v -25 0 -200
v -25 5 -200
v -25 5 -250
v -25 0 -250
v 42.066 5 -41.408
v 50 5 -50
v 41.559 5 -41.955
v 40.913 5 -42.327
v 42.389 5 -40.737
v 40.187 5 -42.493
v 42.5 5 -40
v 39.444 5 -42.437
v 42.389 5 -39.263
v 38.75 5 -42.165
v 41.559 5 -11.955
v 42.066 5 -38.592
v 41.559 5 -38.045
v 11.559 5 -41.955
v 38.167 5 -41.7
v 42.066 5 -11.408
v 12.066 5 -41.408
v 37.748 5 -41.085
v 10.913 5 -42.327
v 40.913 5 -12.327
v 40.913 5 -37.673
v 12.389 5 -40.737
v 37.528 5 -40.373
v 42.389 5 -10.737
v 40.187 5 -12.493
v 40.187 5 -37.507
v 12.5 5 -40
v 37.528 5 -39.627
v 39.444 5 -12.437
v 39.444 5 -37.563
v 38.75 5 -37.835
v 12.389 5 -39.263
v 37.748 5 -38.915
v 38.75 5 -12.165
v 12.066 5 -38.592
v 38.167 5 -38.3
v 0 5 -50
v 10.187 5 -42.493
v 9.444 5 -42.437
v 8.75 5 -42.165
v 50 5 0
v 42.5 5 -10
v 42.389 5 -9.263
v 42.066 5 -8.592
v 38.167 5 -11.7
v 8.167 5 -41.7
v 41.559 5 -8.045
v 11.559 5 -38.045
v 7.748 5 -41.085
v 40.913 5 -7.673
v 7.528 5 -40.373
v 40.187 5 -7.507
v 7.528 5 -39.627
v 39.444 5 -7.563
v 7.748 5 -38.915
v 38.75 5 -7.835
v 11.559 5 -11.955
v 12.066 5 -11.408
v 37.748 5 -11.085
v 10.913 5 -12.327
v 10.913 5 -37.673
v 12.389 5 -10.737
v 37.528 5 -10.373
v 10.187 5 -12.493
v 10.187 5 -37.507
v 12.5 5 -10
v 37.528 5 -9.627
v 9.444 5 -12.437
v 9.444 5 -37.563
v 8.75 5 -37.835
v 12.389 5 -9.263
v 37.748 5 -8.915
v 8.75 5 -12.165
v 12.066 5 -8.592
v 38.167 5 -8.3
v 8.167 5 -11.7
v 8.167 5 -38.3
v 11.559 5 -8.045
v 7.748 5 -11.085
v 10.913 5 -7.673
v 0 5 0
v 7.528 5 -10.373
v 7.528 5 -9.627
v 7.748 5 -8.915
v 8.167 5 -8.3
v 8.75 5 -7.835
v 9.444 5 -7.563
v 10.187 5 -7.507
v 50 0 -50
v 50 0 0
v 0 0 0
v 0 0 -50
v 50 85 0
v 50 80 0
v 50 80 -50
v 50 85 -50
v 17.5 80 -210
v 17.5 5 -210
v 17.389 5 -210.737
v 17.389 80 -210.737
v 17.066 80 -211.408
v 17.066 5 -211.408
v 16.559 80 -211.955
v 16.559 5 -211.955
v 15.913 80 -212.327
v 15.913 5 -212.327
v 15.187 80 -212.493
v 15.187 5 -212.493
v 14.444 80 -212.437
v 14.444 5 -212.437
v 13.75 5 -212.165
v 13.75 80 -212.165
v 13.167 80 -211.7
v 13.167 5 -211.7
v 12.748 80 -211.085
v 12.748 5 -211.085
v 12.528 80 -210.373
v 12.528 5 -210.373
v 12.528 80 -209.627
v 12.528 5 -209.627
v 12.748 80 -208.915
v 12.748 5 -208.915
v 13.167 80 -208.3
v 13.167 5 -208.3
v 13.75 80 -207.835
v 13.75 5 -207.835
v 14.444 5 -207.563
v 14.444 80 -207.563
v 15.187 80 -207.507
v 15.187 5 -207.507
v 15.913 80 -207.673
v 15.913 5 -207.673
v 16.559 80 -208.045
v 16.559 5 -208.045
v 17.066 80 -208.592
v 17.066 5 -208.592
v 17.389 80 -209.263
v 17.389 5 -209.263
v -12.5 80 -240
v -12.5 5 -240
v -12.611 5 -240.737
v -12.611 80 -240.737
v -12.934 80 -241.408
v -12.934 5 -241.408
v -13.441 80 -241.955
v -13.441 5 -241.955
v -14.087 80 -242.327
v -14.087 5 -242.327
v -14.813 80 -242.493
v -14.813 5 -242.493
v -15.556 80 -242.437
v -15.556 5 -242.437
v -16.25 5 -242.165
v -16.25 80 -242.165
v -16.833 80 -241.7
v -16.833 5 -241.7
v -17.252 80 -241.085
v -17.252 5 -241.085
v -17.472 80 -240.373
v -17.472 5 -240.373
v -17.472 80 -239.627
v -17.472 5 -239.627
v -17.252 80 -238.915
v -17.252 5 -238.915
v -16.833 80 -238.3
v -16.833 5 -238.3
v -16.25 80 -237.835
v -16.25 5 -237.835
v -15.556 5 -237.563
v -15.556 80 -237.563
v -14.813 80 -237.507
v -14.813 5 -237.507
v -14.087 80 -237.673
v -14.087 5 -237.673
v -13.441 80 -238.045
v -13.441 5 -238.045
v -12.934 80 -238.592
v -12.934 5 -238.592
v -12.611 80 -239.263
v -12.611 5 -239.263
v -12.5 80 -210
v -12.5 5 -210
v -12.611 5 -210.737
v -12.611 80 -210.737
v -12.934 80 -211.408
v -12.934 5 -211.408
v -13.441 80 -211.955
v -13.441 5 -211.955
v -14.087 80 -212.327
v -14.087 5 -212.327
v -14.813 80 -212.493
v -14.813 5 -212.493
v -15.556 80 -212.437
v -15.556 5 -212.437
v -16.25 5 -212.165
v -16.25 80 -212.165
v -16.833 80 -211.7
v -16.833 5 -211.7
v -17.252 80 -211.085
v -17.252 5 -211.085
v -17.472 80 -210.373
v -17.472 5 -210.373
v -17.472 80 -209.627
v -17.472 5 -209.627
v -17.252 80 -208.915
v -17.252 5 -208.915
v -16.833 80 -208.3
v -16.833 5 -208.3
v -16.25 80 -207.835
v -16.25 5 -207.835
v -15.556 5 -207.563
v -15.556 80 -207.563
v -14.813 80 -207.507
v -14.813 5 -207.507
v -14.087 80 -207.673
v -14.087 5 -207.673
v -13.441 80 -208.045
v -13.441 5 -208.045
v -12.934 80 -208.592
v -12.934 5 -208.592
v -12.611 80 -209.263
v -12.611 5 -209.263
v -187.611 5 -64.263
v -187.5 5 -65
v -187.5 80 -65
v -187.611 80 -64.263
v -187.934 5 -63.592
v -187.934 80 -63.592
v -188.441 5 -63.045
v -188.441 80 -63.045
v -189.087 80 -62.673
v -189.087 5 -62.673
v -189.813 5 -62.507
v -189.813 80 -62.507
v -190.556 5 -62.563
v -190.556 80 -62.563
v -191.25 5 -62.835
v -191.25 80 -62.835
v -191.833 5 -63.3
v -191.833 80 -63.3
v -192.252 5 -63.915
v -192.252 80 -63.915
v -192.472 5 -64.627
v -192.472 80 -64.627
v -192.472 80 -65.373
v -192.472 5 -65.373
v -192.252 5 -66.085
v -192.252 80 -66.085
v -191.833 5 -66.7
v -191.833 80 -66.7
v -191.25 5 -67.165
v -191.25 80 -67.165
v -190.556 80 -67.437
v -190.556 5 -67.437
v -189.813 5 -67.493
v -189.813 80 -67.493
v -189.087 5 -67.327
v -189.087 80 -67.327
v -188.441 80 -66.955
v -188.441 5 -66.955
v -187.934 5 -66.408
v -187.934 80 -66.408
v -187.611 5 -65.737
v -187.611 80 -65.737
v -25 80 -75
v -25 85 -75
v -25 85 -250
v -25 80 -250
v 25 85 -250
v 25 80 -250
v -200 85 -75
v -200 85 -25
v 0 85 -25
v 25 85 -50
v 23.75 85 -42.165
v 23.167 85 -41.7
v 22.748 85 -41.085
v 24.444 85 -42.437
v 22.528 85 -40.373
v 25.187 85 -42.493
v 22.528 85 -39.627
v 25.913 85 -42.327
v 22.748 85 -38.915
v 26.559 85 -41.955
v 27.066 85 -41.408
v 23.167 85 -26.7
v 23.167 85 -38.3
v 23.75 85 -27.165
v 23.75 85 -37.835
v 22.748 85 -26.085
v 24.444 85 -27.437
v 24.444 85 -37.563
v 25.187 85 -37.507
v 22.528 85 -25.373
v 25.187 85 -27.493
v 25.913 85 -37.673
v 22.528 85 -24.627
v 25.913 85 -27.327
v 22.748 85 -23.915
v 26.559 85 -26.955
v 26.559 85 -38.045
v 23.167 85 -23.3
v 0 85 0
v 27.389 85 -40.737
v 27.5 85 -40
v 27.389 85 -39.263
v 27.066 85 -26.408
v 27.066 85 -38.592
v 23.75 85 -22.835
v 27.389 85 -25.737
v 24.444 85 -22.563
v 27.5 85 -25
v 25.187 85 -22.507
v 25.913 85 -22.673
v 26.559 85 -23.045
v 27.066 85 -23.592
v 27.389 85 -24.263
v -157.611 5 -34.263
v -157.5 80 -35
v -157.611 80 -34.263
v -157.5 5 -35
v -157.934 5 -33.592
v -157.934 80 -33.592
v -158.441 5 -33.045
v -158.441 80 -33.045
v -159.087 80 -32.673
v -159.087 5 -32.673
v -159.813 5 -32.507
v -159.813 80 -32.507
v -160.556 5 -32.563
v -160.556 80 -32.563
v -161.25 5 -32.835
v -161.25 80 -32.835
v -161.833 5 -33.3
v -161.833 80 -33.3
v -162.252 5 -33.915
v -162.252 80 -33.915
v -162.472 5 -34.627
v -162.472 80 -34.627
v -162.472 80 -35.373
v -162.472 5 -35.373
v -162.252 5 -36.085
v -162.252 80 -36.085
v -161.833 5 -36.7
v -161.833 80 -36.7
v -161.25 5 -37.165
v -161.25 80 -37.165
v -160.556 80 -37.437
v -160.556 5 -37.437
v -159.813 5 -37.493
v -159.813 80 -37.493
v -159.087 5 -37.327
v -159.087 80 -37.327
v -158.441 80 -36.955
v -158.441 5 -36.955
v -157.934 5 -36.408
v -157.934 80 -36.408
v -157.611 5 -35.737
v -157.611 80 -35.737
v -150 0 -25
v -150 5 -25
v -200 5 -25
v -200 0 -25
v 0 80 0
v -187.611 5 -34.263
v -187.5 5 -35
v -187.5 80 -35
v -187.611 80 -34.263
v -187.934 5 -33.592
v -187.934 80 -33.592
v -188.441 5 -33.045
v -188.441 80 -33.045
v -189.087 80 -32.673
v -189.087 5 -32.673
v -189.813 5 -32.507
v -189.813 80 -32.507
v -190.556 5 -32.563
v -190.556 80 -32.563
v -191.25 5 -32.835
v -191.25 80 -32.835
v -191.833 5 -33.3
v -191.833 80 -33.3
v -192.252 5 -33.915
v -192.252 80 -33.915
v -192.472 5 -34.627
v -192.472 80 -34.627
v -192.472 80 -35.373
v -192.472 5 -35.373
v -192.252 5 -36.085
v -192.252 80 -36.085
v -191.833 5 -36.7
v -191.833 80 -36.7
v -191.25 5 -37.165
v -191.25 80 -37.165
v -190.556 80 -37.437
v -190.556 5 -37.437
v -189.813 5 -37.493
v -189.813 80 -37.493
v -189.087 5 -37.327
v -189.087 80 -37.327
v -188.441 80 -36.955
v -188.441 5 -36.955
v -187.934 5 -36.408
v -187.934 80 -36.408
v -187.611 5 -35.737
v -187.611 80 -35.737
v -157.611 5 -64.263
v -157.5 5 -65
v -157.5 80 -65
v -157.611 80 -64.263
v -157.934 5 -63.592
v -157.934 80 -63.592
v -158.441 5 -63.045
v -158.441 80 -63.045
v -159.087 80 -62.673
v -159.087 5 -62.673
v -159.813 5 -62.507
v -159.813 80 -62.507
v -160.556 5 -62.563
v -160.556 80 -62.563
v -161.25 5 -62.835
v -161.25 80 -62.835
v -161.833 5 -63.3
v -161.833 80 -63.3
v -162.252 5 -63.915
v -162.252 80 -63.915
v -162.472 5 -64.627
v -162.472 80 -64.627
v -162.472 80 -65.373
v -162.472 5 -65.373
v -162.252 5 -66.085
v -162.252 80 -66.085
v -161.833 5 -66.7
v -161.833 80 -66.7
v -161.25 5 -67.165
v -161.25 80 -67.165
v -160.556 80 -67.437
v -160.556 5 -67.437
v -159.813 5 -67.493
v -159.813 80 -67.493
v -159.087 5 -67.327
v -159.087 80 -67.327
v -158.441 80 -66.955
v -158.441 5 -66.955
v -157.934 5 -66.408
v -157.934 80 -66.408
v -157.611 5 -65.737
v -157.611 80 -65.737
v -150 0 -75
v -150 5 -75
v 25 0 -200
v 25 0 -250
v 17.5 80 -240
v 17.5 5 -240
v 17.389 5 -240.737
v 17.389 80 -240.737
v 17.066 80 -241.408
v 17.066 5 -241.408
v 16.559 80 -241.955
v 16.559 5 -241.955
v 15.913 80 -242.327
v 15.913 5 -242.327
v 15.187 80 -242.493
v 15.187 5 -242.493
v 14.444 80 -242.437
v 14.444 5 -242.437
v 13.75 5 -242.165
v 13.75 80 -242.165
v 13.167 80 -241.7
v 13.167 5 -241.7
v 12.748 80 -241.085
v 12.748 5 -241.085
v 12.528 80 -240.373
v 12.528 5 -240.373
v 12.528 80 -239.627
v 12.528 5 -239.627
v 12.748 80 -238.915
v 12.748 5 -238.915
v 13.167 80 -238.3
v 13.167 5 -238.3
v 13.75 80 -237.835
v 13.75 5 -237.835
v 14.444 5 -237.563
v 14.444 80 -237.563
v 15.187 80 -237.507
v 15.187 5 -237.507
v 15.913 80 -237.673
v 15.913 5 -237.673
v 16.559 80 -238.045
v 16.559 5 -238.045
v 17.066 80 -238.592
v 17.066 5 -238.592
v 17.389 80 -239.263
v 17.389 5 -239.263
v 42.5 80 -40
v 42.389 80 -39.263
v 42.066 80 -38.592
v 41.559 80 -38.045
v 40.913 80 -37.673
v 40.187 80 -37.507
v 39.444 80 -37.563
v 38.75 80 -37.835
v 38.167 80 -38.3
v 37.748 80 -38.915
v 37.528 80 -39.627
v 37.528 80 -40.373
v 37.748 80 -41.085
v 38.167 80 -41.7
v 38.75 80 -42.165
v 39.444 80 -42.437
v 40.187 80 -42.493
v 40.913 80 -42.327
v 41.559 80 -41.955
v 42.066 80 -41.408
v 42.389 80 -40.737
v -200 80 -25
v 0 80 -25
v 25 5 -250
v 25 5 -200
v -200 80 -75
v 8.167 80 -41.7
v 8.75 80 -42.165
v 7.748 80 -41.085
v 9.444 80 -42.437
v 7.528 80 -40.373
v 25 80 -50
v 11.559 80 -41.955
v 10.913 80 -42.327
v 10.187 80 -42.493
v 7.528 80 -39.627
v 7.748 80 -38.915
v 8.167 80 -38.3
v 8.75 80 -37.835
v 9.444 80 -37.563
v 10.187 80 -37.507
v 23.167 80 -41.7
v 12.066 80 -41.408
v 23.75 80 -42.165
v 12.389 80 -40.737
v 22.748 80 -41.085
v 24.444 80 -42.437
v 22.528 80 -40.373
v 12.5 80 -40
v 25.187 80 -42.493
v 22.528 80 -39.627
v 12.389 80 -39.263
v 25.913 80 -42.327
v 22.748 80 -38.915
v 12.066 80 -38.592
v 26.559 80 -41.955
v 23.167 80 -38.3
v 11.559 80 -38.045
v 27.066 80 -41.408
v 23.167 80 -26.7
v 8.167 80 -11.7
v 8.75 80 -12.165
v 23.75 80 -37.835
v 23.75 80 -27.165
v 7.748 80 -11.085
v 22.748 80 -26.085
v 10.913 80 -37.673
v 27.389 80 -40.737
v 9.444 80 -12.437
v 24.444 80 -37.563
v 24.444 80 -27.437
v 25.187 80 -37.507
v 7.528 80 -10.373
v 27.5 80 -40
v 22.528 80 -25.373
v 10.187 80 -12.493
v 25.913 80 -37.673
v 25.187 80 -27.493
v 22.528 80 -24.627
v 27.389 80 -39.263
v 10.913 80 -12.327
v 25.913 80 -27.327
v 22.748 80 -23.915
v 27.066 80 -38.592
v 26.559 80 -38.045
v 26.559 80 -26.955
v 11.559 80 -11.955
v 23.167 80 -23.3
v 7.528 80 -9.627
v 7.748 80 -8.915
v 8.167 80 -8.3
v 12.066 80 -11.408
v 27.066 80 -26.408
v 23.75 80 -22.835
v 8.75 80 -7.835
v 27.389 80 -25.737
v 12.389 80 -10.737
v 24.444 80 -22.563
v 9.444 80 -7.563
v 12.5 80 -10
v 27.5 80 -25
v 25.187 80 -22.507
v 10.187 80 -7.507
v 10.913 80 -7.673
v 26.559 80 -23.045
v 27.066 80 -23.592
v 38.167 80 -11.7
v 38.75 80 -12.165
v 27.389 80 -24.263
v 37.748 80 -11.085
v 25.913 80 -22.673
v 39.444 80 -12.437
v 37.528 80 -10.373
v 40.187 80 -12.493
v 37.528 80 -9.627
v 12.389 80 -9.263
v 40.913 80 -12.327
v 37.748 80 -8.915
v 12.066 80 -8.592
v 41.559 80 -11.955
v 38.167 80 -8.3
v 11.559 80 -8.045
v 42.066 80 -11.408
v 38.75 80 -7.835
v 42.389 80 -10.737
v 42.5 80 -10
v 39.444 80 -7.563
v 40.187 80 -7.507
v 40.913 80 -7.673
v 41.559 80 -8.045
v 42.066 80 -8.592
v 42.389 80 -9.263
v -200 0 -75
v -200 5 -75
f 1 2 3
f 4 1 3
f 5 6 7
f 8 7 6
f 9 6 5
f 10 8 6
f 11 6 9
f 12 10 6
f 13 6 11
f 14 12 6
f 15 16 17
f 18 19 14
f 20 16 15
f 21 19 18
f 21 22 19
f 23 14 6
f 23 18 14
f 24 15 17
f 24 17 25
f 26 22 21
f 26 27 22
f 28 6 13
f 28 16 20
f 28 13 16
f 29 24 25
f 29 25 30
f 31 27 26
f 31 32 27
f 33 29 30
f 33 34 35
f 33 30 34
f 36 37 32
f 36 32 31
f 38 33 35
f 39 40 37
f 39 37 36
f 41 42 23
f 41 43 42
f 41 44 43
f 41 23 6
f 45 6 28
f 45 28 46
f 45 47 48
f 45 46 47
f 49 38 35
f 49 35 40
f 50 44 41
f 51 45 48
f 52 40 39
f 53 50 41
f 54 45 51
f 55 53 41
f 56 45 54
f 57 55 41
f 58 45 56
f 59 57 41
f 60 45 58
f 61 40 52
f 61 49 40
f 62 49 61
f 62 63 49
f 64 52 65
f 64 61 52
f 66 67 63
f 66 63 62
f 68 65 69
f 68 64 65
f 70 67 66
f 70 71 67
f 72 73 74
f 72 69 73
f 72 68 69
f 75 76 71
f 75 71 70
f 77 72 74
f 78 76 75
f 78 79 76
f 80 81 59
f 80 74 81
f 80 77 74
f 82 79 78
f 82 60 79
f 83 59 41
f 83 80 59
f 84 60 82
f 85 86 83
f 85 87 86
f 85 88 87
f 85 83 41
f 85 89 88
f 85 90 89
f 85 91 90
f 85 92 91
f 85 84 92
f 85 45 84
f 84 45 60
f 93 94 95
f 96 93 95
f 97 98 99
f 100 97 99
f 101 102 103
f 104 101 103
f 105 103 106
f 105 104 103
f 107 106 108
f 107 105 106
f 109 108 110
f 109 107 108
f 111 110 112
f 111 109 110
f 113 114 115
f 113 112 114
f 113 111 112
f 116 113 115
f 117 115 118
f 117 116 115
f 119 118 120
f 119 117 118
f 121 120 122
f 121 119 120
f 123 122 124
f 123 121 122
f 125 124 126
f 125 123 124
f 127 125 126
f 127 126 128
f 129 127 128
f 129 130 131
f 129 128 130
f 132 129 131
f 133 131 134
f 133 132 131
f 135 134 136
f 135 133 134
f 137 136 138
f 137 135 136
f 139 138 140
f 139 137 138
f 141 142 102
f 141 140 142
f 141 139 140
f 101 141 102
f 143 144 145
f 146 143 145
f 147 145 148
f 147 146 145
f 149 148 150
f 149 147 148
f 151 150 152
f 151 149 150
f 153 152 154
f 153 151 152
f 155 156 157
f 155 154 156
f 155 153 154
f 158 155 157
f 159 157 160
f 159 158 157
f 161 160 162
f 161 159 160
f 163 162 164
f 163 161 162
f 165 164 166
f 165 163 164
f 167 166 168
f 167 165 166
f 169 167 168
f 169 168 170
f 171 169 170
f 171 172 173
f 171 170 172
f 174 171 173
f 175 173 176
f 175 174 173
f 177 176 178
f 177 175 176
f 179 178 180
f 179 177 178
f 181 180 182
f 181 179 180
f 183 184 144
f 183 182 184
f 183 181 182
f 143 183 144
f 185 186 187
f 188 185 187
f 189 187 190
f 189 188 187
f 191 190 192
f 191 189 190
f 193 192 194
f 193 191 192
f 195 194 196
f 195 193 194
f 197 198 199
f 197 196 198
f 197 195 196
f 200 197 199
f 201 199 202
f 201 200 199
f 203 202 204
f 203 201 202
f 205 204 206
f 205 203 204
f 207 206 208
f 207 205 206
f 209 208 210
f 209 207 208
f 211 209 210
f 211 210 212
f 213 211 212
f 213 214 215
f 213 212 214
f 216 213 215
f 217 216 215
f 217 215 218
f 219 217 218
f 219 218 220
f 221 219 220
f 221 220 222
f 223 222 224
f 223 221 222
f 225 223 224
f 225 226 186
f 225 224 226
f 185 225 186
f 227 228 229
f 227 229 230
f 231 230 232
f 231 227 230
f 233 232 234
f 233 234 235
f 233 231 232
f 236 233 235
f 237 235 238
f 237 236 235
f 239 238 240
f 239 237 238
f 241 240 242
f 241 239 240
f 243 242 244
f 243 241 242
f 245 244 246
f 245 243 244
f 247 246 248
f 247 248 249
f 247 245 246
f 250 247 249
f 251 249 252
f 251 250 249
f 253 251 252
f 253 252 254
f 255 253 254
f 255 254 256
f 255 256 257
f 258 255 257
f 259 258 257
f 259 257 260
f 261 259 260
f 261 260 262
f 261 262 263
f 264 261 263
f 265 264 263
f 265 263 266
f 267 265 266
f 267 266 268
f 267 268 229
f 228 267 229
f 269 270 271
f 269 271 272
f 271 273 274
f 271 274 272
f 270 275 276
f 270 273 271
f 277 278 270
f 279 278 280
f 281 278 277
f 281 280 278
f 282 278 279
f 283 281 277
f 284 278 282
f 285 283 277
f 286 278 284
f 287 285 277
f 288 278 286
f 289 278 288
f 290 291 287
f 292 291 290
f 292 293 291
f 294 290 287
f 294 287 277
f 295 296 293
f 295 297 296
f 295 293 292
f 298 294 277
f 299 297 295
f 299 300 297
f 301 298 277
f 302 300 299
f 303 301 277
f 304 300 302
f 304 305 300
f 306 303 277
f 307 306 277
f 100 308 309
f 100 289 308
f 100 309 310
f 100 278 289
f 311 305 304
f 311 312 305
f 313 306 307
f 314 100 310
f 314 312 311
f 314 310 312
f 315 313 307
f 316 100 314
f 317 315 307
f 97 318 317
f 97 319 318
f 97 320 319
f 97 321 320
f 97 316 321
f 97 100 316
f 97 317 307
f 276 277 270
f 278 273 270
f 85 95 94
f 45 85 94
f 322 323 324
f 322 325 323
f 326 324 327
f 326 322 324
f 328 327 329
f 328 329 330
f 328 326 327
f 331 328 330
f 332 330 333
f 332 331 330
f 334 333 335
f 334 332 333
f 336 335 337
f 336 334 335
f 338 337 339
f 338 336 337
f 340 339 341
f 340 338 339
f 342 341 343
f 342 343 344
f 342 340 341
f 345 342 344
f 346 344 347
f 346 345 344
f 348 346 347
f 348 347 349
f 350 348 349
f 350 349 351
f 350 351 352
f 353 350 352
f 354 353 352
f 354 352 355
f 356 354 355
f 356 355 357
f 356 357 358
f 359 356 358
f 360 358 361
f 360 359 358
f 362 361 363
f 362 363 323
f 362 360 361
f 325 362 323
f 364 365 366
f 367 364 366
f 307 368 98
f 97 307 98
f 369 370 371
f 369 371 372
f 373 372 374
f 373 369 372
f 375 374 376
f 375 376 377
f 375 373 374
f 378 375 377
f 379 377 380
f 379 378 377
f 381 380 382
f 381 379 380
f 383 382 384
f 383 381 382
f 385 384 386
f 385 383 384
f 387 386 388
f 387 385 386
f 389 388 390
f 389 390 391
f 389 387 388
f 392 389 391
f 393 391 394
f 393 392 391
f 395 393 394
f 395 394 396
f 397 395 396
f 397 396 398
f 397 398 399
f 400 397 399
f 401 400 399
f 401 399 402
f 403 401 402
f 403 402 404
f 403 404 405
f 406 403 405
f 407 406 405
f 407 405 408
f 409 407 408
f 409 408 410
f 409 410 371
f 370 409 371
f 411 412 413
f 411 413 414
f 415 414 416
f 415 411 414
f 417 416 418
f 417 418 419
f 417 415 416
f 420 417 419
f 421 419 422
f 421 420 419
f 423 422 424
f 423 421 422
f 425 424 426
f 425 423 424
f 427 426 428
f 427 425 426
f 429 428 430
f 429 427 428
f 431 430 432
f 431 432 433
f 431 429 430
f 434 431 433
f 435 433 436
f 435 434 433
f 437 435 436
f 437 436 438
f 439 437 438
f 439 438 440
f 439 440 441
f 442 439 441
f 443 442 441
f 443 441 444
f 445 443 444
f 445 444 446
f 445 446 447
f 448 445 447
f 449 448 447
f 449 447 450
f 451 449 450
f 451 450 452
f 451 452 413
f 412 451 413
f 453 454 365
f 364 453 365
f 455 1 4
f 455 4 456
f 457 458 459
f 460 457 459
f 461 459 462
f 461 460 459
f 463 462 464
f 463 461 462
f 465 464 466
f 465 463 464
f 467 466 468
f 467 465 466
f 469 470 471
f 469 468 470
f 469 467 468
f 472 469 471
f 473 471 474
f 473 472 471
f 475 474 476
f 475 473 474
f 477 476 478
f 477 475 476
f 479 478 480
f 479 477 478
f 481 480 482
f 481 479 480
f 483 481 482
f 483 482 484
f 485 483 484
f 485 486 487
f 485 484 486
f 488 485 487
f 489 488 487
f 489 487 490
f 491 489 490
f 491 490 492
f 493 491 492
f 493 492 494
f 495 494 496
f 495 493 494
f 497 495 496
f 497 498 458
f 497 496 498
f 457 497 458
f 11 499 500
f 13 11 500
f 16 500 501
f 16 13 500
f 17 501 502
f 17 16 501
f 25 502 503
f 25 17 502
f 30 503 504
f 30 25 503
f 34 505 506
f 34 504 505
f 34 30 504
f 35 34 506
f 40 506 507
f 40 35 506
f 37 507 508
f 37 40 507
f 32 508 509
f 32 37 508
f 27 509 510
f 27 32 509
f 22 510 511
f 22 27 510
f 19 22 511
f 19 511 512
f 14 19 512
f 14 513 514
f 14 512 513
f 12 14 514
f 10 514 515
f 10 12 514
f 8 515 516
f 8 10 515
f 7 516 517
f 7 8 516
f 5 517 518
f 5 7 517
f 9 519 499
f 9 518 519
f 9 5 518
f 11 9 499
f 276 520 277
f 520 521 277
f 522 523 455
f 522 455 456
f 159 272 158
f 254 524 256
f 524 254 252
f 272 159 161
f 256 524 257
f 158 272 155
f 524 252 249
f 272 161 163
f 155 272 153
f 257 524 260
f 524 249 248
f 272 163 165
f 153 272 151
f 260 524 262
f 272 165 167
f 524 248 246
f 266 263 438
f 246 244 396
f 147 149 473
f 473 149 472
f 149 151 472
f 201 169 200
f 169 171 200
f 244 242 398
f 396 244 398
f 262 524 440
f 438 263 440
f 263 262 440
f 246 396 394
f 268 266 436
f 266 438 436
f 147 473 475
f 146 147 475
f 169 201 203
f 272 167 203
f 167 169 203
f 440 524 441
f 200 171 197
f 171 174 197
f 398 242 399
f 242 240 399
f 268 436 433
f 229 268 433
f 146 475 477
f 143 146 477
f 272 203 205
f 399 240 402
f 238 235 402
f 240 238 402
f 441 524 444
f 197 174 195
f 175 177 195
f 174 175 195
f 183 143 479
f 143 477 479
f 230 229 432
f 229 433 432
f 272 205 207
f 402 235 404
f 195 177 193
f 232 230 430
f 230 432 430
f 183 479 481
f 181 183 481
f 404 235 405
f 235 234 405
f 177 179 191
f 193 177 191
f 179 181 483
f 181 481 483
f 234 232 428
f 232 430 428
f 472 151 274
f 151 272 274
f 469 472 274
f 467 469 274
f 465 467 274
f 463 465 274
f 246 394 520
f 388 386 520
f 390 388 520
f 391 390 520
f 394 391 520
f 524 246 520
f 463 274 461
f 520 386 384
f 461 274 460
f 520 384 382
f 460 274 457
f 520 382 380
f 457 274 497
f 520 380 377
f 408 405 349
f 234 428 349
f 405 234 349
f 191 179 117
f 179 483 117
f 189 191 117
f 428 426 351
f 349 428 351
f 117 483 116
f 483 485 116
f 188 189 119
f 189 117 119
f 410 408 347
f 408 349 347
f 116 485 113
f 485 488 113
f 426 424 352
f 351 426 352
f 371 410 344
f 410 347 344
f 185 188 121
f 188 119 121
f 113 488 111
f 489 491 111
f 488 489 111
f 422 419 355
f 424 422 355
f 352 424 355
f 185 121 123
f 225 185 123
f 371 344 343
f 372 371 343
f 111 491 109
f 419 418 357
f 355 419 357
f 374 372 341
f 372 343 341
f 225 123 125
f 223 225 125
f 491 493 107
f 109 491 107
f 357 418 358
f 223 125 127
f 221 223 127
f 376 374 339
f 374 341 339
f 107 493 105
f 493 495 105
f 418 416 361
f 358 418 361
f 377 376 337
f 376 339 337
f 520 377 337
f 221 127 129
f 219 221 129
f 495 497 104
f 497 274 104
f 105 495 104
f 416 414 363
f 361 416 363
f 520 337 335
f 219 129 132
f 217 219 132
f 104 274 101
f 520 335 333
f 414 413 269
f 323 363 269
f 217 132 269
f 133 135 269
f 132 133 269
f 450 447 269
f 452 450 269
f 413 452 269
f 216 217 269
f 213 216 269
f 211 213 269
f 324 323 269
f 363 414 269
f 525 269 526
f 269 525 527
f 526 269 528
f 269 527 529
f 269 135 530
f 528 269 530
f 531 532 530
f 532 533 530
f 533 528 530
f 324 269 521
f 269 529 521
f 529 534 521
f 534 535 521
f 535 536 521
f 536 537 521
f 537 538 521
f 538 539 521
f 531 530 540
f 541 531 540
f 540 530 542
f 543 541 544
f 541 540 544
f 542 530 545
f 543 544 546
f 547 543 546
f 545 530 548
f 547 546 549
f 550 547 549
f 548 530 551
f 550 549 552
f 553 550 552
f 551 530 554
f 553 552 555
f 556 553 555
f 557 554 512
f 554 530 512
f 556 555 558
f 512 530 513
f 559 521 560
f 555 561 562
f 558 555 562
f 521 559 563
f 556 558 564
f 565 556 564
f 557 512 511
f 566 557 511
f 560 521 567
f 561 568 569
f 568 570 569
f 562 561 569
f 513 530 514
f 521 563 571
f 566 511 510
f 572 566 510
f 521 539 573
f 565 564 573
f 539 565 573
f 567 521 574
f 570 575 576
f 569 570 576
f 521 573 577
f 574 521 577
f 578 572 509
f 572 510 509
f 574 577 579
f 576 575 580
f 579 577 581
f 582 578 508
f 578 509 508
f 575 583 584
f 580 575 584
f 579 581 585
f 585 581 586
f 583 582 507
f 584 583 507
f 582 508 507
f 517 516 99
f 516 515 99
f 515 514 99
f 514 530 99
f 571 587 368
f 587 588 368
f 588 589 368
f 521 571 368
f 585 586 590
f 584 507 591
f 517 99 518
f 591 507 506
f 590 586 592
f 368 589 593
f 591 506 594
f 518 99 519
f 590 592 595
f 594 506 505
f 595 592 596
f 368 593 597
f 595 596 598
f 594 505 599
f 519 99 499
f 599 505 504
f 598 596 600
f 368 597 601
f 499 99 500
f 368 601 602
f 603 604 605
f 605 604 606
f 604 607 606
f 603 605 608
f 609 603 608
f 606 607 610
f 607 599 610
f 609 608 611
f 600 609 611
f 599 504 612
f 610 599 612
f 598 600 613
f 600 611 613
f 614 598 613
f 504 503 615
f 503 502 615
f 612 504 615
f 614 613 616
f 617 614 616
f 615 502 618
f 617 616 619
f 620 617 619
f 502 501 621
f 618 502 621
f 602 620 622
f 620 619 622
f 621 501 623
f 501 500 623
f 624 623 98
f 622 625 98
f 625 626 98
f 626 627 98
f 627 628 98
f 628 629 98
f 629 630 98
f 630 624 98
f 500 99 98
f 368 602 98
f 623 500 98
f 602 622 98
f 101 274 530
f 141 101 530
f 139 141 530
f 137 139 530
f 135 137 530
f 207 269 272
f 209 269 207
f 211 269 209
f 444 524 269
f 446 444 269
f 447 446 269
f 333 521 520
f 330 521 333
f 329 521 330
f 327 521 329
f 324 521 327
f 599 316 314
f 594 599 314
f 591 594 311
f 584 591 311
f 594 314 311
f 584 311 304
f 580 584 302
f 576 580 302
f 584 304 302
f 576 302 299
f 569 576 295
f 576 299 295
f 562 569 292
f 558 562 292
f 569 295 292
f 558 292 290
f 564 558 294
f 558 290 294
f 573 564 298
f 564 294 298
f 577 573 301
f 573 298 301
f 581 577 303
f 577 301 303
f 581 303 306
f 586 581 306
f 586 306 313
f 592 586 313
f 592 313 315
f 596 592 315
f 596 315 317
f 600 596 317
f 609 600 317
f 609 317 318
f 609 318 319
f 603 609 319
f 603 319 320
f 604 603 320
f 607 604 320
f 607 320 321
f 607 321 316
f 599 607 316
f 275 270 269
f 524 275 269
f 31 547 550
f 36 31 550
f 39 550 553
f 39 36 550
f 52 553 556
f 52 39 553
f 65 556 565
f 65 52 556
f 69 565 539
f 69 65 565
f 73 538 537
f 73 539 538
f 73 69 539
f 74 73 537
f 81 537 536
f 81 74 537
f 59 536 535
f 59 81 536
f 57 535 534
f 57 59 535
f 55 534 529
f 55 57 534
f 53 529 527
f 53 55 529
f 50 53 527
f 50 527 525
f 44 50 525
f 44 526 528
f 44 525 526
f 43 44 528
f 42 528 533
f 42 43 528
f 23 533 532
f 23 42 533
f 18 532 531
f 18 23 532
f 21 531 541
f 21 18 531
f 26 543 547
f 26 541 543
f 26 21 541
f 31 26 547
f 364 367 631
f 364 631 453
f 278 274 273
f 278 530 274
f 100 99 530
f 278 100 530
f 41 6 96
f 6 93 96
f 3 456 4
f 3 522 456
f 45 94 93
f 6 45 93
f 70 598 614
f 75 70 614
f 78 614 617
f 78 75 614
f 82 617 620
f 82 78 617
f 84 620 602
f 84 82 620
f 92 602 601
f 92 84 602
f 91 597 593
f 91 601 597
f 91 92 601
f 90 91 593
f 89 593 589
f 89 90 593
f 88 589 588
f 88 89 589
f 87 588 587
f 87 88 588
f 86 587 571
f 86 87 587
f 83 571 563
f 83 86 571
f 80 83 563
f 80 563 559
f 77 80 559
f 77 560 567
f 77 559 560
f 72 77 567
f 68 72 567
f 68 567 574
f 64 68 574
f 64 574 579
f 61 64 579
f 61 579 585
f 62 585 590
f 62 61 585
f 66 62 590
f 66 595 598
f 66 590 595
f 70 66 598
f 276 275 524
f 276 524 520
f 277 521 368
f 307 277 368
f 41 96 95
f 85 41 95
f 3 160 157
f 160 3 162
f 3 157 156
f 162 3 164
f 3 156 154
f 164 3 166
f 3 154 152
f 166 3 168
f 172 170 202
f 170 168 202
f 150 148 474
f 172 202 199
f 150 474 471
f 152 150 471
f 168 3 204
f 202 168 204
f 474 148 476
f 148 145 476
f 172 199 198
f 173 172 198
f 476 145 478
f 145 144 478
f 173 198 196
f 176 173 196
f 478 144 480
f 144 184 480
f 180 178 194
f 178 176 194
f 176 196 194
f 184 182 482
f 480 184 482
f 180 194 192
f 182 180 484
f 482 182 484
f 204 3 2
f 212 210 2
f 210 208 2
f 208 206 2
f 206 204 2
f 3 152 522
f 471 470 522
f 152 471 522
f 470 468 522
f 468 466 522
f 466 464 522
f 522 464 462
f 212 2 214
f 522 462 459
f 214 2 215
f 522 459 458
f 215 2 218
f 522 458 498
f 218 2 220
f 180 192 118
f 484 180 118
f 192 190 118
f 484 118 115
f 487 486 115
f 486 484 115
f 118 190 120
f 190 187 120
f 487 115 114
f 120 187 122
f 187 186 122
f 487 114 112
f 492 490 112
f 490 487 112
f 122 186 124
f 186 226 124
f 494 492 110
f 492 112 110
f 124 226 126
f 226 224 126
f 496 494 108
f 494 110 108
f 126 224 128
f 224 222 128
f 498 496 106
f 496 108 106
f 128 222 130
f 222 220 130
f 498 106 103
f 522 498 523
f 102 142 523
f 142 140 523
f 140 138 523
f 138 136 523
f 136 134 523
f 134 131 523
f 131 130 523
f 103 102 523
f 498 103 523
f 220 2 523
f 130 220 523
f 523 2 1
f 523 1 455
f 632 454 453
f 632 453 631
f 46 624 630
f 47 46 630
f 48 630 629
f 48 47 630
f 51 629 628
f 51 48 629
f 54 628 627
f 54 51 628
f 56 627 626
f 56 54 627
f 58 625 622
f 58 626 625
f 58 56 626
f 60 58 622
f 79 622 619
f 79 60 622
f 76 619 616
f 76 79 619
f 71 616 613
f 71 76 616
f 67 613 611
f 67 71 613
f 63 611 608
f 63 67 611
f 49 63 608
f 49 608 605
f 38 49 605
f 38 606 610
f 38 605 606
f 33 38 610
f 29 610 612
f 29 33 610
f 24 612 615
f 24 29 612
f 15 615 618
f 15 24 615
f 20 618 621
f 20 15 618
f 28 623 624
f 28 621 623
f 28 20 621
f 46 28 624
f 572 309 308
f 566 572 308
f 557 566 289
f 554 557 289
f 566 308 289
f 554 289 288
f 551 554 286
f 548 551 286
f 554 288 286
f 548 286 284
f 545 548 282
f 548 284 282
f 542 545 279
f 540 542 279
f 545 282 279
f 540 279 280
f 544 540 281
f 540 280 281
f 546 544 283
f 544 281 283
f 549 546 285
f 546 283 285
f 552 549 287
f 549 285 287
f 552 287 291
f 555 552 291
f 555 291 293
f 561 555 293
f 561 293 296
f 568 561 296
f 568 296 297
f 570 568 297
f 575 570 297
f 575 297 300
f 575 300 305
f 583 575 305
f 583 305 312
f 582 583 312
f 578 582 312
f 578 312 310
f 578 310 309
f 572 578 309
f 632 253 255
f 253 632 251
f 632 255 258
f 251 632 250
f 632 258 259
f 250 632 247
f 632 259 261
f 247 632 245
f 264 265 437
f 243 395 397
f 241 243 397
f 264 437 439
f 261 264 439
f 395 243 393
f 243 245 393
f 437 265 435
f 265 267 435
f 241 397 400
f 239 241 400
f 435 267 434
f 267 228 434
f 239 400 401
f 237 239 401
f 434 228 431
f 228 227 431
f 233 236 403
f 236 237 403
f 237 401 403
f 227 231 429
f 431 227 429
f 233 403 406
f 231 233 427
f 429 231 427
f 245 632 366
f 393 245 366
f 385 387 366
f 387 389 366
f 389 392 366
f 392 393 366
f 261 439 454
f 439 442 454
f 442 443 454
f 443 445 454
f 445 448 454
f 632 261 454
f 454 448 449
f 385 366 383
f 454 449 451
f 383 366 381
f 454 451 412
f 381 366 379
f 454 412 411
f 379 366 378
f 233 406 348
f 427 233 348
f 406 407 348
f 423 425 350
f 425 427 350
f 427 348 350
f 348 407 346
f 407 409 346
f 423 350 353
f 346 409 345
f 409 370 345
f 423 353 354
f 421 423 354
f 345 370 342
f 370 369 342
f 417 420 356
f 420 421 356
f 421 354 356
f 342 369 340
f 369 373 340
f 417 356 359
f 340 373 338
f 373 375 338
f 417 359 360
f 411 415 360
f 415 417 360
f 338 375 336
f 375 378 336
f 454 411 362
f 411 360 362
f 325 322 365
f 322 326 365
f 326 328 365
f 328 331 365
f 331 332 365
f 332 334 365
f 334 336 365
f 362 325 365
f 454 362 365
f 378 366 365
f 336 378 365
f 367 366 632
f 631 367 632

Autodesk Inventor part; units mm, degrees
ref_plane "YZ Plane" through (0, 0, 0) normal (1, 0, 0) x (0, 1, 0)
ref_plane "XZ Plane" through (0, 0, 0) normal (0, 1, 0) x (-1, 0, 0)
ref_plane "XY Plane" through (0, 0, 0) normal (0, 0, 1) x (1, 0, 0)
sketch "Boceto1" plane through (0, 0, 0) normal (0, 1, 0) x (-1, 0, 0)
  line L0 (0, 0) -> (-50, 0)
  line L1 (-50, 0) -> (-50, -50)
  line L2 (-50, -50) -> (0, -50)
  line L3 (0, -50) -> (0, 0)
  dimension "d0" = 50
  dimension "d1" = 50
extrude "Extrusión1" add sketch "Boceto1" along normal blind 5
sketch "Boceto2" plane through (0, 5, 0) normal (0, 1, 0) x (1, 0, 0)
  circle A0 centre (10, 10) radius 2.5
  line L0 (0, 50) -> (0, 0) projected
  line L1 (0, 0) -> (50, 0) projected
  circle A1 centre (10, 40) radius 2.5
  circle A2 centre (40, 10) radius 2.5
  circle A3 centre (40, 40) radius 2.5
  line L2 (50, 50) -> (0, 50) projected
  line L3 (50, 0) -> (50, 50) projected
  dimension "d4" = 5
  dimension "d5" = 10
  dimension "d6" = 10
  dimension "d7" = 5
  dimension "d8" = 5
  dimension "d9" = 5
  dimension "d10" = 10
  dimension "d11" = 10
  dimension "d12" = 10
  dimension "d13" = 10
  dimension "d14" = 10
  dimension "d15" = 10
extrude "Extrusión2" add sketch "Boceto2" along normal blind 75 contours A0 | A1 | A2 | A3
sketch "Boceto3" plane through (10, 80, -10) normal (0, 1, 0) x (1, 0, 0)
  line L0 (-10, -10) -> (40, -10) projected
  line L1 (40, 40) -> (-10, 40) projected
  line L2 (-10, -10) -> (40, -10)
  line L3 (40, -10) -> (40, 40)
  line L4 (40, 40) -> (-10, 40)
  line L5 (-10, 40) -> (-10, -10)
extrude "Extrusión3" add sketch "Boceto3" along normal blind 5
sketch "Boceto4" plane through (10, 85, -10) normal (0, 1, 0) x (1, 0, 0)
  circle A0 centre (15, 15) radius 2.5
  line L0 (40, 40) -> (-10, 40) projected
  line L1 (-10, 40) -> (-10, -10) projected
  dimension "d20" = 5
  dimension "d21" = 25
  dimension "d22" = 25
extrude "Extrusión4" cut sketch "Boceto4" against normal blind 5
thread "Rosca1" size "M5x0.8" class "6H" standard "ANSI Metric M Profile" full length
sketch "Boceto7" plane through (50, 80, -50) normal (0, 0, -1) x (-1, 0, 0)
  line L0 (0, 5) -> (50, 5) projected
  line L1 (25, 5) -> (75, 5)
  line L2 (75, 5) -> (75, 0)
  line L3 (75, 0) -> (25, 0)
  line L4 (25, 0) -> (25, 5)
  point P0 (50, -80)
  dimension "d34" = 50
  dimension "d35" = 5
extrude "Extrusión7" add sketch "Boceto7" along normal blind 200
sketch "Boceto8" plane through (0, 80, 0) normal (-1, 0, 0) x (0, 0, 1)
  line L0 (-50, 5) -> (0, 5) projected
  line L1 (-50, 0) -> (-250, 0) projected
  line L2 (-25, 5) -> (-75, 5)
  line L3 (-75, 5) -> (-75, 0)
  line L4 (-75, 0) -> (-25, 0)
  line L5 (-25, 0) -> (-25, 5)
  point P0 (0, -80)
  dimension "d38" = 50
extrude "Extrusión8" add sketch "Boceto8" along normal blind 200
sketch "Boceto9" plane through (10, 85, -10) normal (0, 1, 0) x (1, 0, 0)
  circle A0 centre (15, 30) radius 2.5
  circle A1 centre (15, 15) radius 2.5 projected
  point P0 (-10, -10)
  dimension "d41" = 5
  dimension "d42" = 15
  dimension "d43" = 0
extrude "Extrusión9" cut sketch "Boceto9" against normal blind 10 contours A0
thread "Rosca2" size "M5x0.8" class "6H" standard "ANSI Metric M Profile" full length
sketch "Boceto10" plane through (10, 80, -10) normal (0, -1, 0) x (1, 0, 0)
  circle A0 centre (5, -230) radius 2.5
  circle A1 centre (-25, -230) radius 2.5
  circle A2 centre (-25, -200) radius 2.5
  circle A3 centre (5, -200) radius 2.5
  line L0 (15, -240) -> (-35, -240) projected
  line L1 (15, -40) -> (15, -240) projected
  line L2 (-35, -65) -> (-35, -240) projected
  line L3 (15, -40) -> (15, -240) construction
  line L4 (15, -190) -> (-35, -190) construction
  point P0 (-10, 10)
  dimension "d48" = 5
  dimension "d49" = 5
  dimension "d50" = 5
  dimension "d51" = 5
  dimension "d52" = 10
  dimension "d53" = 10
  dimension "d54" = 10
  dimension "d55" = 10
  dimension "d56" = 50
  dimension "d57" = 10
  dimension "d58" = 10
  dimension "d59" = 10
  dimension "d60" = 10
extrude "Extrusión10" add sketch "Boceto10" along normal blind 75
sketch "Boceto11" plane through (-15, 5, -240) normal (0, -1, 0) x (1, 0, 0)
  circle A0 centre (-145, 175) radius 2.5
  circle A1 centre (-175, 175) radius 2.5
  circle A2 centre (-145, 205) radius 2.5
  circle A3 centre (-175, 205) radius 2.5
  line L0 (15, 215) -> (-185, 215) projected
  line L1 (-185, 165) -> (-185, 215) projected
  line L2 (-10, 165) -> (-185, 165) construction
  line L3 (-135, 165) -> (-135, 215) construction
  point P0 (15, 240)
  dimension "d63" = 5
  dimension "d64" = 5
  dimension "d65" = 5
  dimension "d66" = 5
  dimension "d67" = 10
  dimension "d68" = 10
  dimension "d69" = 50
  dimension "d70" = 10
  dimension "d71" = 10
  dimension "d72" = 10
  dimension "d73" = 10
  dimension "d74" = 10
  dimension "d75" = 10
extrude "Extrusión11" add sketch "Boceto11" against normal blind 75
sketch "Boceto12" plane through (-190, 5, -35) normal (0, -1, 0) x (1, 0, 0)
  line L0 (215, -15) -> (215, -215) projected
  line L1 (165, -40) -> (165, -215) projected
  line L2 (215, -215) -> (165, -215)
  line L3 (165, -215) -> (165, -165)
  line L4 (165, -165) -> (215, -165)
  line L5 (215, -165) -> (215, -215)
  line L6 (165, -40) -> (-10, -40) projected
  line L7 (190, 10) -> (-10, 10) projected
  line L8 (-10, -40) -> (40, -40)
  line L9 (40, -40) -> (40, 10)
  line L10 (40, 10) -> (-10, 10)
  line L11 (-10, 10) -> (-10, -40)
  point P0 (190, 35)
  dimension "d78" = 50
  dimension "d79" = 50
extrude "Extrusión12" add sketch "Boceto12" along normal blind 5
properties part number "Soporte - C15_3DPrint"
